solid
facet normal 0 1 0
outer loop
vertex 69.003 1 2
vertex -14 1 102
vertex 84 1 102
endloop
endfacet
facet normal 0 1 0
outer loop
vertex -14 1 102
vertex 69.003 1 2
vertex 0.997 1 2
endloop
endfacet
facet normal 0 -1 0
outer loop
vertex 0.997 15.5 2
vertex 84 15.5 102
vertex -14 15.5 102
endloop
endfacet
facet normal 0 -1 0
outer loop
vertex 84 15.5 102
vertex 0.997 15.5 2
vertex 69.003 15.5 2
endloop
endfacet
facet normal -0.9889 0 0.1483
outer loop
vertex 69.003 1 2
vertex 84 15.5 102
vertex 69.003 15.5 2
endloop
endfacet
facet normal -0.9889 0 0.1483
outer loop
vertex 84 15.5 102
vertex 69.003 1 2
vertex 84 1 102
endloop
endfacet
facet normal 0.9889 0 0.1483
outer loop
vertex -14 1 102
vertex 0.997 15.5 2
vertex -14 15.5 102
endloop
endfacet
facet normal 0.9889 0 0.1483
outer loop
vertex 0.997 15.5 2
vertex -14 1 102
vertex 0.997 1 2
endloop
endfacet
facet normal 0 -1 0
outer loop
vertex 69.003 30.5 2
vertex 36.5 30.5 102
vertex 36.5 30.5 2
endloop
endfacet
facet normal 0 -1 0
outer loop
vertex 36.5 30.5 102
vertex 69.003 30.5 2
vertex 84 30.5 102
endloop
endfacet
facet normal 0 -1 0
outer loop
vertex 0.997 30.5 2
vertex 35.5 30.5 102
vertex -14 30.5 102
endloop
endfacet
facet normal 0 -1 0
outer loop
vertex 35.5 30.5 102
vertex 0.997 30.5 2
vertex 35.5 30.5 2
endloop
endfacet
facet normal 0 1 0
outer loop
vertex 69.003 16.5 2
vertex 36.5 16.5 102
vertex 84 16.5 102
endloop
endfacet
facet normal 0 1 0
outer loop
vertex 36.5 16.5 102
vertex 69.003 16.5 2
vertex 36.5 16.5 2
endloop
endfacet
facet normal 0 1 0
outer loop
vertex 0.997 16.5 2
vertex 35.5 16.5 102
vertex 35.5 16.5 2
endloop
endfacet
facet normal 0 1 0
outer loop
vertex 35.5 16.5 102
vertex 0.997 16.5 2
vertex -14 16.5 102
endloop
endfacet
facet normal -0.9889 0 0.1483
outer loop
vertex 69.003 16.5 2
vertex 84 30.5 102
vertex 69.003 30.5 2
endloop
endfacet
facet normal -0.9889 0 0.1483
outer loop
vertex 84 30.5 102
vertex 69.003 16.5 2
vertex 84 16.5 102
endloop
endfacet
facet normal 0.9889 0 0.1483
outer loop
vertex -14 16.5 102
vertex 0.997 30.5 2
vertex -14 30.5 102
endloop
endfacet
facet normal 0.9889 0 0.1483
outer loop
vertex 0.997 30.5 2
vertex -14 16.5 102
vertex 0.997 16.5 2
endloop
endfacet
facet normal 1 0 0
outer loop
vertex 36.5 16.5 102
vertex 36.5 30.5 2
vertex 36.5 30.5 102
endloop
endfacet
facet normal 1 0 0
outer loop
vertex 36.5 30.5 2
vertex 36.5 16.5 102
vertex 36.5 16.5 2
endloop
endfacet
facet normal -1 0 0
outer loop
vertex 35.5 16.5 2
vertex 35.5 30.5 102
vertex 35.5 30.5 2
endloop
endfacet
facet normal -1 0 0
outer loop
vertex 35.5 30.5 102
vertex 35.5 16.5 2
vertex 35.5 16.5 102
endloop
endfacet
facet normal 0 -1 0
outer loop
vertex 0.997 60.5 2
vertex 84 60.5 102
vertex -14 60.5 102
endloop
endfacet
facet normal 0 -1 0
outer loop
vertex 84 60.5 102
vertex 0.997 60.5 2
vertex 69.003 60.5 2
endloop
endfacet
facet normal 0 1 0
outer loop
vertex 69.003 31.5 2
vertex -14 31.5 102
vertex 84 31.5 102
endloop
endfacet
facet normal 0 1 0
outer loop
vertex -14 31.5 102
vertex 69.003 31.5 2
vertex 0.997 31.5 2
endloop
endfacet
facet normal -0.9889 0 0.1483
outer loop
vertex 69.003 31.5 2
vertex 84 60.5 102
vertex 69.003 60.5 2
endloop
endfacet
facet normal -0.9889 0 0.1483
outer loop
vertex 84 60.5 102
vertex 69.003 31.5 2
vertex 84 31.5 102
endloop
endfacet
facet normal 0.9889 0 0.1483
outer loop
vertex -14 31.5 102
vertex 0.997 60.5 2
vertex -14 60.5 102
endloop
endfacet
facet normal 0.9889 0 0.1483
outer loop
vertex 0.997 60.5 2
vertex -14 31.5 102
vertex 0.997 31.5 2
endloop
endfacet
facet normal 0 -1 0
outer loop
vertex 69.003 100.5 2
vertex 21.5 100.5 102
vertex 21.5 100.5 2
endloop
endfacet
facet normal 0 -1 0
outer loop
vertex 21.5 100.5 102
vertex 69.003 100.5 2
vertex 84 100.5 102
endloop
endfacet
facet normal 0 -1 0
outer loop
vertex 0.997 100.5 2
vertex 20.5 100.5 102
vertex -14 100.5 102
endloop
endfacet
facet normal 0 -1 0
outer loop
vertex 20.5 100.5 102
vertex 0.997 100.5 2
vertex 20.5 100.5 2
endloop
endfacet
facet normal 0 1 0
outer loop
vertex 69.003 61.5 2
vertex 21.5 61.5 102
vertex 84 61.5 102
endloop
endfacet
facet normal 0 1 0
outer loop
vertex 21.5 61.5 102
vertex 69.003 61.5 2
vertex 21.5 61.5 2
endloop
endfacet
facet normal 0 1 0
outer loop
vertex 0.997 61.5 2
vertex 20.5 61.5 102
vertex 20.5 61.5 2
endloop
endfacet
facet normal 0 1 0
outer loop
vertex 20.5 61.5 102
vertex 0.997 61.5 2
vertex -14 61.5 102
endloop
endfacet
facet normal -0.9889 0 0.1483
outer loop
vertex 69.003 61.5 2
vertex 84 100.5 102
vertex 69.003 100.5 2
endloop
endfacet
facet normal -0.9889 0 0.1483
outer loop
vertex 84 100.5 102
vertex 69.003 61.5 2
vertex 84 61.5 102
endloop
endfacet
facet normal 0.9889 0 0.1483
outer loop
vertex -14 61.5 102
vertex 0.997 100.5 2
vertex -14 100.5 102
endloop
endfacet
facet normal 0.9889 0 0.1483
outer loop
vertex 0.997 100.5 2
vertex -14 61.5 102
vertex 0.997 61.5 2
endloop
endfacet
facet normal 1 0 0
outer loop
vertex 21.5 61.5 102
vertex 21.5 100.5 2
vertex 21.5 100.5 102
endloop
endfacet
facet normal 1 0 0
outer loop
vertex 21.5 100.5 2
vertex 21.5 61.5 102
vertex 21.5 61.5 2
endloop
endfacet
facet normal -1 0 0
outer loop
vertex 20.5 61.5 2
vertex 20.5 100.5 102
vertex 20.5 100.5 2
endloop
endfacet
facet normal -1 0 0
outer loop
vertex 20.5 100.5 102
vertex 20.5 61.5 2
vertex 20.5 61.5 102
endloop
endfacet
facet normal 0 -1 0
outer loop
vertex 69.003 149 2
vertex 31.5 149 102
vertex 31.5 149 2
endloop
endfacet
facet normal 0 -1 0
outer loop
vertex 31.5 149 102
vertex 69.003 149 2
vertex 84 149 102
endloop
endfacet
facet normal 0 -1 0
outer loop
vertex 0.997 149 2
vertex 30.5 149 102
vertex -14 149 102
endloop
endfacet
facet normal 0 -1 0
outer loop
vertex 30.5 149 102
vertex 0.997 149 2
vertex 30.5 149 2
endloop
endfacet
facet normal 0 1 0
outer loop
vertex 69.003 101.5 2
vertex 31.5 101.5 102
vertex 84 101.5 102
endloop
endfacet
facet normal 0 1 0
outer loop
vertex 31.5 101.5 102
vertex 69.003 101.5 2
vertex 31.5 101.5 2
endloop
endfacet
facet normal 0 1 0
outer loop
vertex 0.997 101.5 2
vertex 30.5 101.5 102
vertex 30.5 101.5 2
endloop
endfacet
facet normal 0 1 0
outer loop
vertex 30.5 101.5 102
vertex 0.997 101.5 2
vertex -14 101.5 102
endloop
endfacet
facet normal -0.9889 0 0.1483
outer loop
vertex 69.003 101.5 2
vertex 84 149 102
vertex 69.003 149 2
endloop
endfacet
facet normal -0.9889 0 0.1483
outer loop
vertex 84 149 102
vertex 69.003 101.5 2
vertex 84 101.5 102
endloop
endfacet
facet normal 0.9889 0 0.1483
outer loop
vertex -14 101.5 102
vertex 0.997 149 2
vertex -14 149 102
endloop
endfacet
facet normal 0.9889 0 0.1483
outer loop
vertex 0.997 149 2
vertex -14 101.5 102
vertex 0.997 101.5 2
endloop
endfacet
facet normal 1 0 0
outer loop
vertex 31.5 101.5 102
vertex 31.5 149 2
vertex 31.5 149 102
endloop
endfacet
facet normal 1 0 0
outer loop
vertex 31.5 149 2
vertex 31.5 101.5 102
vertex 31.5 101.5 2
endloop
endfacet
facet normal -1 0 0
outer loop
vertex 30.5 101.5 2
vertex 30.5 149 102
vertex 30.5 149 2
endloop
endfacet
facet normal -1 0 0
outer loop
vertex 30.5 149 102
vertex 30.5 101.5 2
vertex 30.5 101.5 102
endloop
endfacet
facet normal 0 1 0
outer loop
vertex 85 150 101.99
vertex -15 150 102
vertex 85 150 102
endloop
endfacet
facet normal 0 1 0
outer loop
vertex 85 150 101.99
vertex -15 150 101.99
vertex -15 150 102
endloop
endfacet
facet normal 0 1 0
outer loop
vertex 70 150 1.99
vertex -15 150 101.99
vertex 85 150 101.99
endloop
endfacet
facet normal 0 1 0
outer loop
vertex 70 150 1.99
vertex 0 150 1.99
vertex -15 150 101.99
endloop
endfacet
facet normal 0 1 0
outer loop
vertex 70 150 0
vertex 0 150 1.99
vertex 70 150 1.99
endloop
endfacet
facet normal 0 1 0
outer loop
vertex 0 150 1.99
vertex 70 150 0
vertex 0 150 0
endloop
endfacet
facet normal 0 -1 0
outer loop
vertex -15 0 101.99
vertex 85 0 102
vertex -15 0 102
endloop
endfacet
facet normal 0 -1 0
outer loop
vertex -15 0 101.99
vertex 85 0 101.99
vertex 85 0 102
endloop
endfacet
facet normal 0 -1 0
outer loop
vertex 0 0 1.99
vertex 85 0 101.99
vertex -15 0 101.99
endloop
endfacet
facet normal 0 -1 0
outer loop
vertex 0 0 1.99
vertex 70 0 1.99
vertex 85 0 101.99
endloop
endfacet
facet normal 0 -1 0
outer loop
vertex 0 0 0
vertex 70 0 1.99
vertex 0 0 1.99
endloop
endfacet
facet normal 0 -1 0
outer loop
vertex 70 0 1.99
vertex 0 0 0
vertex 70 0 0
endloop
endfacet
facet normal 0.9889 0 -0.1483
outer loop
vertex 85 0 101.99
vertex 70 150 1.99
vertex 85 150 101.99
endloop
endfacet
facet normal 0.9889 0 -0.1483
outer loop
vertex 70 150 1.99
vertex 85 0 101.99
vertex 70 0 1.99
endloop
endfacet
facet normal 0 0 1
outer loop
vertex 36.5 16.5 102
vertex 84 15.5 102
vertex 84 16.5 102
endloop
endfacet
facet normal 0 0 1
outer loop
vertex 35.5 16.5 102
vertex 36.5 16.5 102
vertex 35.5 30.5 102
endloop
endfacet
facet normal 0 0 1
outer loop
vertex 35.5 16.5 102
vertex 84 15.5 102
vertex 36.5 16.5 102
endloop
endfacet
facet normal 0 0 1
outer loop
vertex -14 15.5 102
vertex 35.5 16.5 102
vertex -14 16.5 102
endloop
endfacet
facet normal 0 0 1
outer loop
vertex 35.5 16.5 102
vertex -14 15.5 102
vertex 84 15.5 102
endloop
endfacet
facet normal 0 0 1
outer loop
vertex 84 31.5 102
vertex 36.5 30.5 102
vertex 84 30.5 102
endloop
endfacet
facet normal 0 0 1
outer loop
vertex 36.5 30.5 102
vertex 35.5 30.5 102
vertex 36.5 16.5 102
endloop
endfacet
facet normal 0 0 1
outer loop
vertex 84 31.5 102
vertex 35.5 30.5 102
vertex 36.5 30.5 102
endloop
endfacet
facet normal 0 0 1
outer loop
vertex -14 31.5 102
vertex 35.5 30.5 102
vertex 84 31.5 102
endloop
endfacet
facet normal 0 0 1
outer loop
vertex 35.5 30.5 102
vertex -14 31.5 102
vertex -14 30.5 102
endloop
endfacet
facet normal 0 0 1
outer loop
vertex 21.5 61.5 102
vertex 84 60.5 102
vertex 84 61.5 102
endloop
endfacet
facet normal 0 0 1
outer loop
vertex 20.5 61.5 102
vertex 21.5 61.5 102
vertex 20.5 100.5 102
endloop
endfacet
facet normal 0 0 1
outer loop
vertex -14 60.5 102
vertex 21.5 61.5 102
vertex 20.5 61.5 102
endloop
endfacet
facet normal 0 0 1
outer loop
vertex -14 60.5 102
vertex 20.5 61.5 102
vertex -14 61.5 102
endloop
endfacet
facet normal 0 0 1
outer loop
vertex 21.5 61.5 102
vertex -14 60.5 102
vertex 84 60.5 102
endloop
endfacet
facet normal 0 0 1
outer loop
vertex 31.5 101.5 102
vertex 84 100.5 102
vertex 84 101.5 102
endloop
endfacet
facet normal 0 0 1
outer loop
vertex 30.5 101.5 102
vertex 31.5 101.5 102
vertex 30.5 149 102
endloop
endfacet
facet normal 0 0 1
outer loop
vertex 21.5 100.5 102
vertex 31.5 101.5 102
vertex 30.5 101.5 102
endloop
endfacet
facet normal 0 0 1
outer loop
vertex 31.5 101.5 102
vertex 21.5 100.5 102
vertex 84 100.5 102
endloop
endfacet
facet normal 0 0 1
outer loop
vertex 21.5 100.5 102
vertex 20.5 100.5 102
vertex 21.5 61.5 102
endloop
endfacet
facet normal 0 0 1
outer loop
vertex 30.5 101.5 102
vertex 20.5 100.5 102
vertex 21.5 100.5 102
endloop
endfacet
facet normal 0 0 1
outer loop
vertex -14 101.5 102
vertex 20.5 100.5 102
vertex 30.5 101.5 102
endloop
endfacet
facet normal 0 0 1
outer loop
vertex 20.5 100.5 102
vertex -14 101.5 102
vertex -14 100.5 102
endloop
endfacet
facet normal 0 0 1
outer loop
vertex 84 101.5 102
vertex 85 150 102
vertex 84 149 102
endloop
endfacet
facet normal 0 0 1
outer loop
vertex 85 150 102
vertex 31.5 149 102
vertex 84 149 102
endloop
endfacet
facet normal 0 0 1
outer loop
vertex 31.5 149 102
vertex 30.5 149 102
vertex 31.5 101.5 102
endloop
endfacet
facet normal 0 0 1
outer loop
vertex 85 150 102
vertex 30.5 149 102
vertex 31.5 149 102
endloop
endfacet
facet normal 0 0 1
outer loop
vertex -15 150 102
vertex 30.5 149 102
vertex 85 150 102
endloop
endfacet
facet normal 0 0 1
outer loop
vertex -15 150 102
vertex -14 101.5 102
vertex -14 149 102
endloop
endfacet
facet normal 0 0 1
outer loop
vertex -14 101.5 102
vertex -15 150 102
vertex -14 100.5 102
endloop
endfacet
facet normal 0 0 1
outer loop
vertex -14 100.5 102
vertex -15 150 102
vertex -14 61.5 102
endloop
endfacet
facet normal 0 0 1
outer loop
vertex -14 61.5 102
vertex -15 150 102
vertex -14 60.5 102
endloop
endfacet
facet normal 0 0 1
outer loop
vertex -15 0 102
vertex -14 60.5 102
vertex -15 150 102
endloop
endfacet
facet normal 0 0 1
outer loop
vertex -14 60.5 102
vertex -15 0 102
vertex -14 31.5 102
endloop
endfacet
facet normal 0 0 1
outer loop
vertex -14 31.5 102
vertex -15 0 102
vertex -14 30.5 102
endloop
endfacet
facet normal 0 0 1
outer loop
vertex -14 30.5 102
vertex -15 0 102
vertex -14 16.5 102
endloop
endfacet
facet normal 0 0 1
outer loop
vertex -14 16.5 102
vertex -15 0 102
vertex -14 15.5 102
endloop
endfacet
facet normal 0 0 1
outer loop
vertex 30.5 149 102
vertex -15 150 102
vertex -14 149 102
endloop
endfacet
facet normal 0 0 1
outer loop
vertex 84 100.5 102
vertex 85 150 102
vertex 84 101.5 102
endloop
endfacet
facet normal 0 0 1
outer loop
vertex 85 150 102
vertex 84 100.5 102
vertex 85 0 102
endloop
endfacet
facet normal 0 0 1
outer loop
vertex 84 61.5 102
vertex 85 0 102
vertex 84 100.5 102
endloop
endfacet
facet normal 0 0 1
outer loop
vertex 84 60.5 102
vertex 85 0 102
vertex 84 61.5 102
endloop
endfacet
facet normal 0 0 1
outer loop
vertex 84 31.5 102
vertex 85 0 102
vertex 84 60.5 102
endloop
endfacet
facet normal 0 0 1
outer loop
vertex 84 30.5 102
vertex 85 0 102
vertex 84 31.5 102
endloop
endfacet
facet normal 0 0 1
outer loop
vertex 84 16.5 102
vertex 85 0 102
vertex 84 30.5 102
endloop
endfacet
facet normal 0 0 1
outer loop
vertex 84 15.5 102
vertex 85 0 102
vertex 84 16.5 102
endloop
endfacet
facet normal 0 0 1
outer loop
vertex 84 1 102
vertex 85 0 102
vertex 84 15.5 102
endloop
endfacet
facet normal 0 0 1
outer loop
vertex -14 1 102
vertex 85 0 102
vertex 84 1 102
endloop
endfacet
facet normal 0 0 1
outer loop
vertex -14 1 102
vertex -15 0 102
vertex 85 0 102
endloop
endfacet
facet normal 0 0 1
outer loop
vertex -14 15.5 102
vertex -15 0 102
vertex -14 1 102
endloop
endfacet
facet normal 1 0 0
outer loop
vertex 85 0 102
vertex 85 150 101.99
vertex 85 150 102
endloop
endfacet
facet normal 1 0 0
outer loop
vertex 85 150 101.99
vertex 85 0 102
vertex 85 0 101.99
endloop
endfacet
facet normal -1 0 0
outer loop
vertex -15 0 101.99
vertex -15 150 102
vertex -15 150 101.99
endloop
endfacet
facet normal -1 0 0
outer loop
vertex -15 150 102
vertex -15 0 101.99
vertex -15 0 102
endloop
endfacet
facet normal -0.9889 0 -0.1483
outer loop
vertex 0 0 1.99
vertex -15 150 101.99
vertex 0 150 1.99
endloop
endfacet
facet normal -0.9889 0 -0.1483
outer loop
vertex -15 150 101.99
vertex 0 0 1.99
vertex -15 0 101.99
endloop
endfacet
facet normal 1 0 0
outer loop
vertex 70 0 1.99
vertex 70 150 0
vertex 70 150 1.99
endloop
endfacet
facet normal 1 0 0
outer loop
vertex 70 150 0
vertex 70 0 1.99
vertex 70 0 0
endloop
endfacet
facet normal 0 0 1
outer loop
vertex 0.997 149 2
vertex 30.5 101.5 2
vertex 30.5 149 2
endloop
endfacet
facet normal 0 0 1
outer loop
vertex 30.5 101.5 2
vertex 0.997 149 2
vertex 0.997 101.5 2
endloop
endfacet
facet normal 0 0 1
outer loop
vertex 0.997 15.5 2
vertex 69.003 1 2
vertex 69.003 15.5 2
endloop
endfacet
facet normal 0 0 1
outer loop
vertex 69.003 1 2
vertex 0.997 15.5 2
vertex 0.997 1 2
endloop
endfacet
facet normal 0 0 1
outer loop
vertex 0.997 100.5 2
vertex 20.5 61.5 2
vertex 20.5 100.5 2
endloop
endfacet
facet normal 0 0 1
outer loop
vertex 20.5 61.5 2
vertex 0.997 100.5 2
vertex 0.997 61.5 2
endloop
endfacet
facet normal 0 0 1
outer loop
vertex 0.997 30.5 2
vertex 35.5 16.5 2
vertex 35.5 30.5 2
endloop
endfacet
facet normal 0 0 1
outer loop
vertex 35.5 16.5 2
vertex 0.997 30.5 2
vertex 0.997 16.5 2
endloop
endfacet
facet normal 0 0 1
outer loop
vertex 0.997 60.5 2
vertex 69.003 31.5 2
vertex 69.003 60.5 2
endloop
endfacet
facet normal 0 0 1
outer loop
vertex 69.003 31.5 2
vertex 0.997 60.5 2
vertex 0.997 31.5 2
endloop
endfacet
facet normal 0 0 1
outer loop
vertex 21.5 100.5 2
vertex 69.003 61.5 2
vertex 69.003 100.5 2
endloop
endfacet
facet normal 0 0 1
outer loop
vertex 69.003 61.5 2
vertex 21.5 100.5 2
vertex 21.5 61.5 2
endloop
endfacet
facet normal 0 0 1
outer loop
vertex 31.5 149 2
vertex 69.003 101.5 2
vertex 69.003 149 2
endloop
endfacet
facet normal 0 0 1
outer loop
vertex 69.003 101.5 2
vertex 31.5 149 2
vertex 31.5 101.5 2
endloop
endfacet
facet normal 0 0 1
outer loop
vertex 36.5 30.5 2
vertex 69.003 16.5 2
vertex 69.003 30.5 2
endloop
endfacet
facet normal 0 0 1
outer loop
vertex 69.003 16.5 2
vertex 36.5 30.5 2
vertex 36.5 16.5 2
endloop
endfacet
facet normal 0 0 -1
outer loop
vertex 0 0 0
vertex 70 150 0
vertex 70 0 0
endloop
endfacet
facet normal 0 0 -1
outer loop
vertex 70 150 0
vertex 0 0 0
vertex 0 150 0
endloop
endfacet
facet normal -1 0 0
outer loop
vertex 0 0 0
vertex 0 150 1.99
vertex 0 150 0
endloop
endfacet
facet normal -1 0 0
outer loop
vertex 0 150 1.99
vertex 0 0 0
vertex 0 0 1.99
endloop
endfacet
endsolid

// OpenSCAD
// file: caddy_organizer_divider.scad
/*
 * Designed for tool caddy found at WM or auto parts stores with
 * center handle and a deep tray on either side.  Makes some of
 * the space useable for holding larger tools upright.
 */

$fn=50;
overlap=0.01;

caddyOrganizerDivider(); // test defaults.

// Show "missing zero offset element" bug
translate([75,0,0])
    caddyOrganizerDivider(crosswaysDividerOffsets=[30]);
    

module caddyOrganizerDivider(bottomThickness=2, wallThickness=1, 
        bottomWidth=50, topWidth=55,
        bottomLength=75, topLength=80,
        wallHeight=25,
        crosswaysDividerOffsets=[0,30],
        lengthwiseSplits=[[25],[15,35]]) {

    innerLengthBottom=bottomLength-wallThickness*2;
    innerLengthTop=topLength-wallThickness*2;
    extraLengthTop=innerLengthTop-innerLengthBottom;
    // bottom
    cube([bottomWidth,bottomLength,bottomThickness]);

    difference() {
        // outer shell - sides tapered, ends square 
        translate([0,0,bottomThickness-overlap])
            taperedBox(bw=bottomWidth, tw=topWidth, bl=bottomLength, tl=topLength, ht=wallHeight+overlap);
        // cross slots

        if (crosswaysDividerOffsets[0] != 0)
            echo("Warning: First item in crosswaysDividerOffsets must be zero.");
        // TODO: Fix logic when crosswaysDividers does not have 0 as its first value.

        for (i=[0:1:len(crosswaysDividerOffsets)-1]) {
            isFirstCutout=(i==0);
            isLastCutout=(i==(len(crosswaysDividerOffsets)-1));
            cutoutLengthBottom = ((!isLastCutout) ? // up to the penultimate item
                (crosswaysDividerOffsets[i+1]-crosswaysDividerOffsets[i]) :  // if there is another divider
                (innerLengthBottom-crosswaysDividerOffsets[i]))  // if this is the last divider
                - ((isFirstCutout || isLastCutout) ? wallThickness/2 : wallThickness);
            cutoutLengthTop = ((!isLastCutout) ? // up to the penultimate item
                (crosswaysDividerOffsets[i+1]-crosswaysDividerOffsets[i]) :  // if there is another divider, length is next offset - this offset
                (innerLengthBottom-crosswaysDividerOffsets[i]))  // if this is the last divider
                + ((isFirstCutout || isLastCutout) ? extraLengthTop/2 : 0)
                - ((isFirstCutout || isLastCutout) ? wallThickness/2 : wallThickness);
            // echo(cutoutLengthBottom);
            //    outer wall + 1 more wall thickness after each pocket.
            yPosition = wallThickness + ((i==0) ? 0 : crosswaysDividerOffsets[i]+wallThickness/2);
            translate([wallThickness, yPosition, bottomThickness-overlap*2]) {
                // flip and shift only the first block
               translate([0,((isFirstCutout) ? cutoutLengthBottom : 0),0]) mirror([0,((isFirstCutout) ? 1 : 0),0]) {
                difference() {
                    // crossways block
                        taperedBox(bw=bottomWidth-wallThickness*2, tw=topWidth-wallThickness*2, 
                            bl=cutoutLengthBottom, tl=cutoutLengthTop, 
                                ht=wallHeight+overlap*3, centerLengthWise=false);
                        for (l=[0:1:len(lengthwiseSplits[i])-1]) {        
                            if (len(lengthwiseSplits[i]) != 0) {
                                translate([lengthwiseSplits[i][l]-wallThickness/2,-overlap,-overlap])
                                    cube([wallThickness,cutoutLengthTop+overlap*2,wallHeight+overlap*5]);
                            }
                        } 
                    }  // flip and shift everything
                }
            }        
        }
    }
}


module taperedBox(bw, tw, bl, tl, ht, centerWidthWise=true, centerLengthWise=true) {
    hull() {
        translate([0,0,0])
            cube([bw,bl,overlap]);
        translate([((centerWidthWise) ? -(abs(tw-bw)/2) : 0), ((centerLengthWise) ? -(abs(tl-bl)/2) : 0),ht-overlap])
            cube([tw,tl,overlap]);
    }
}
// main file
use <caddy_organizer_divider.scad>

// short, ~1/3 of the side pocket of the large aluminum bar handle caddy
bottomWidth=70;
topWidth=100;
wallHeight=100;
crosswaysDividerOffsets=[0,15,30,60,100];
lengthwiseSplits=[[],[35],[],[20],[30]];
bottomLength=150;
topLength=150;

caddyOrganizerDivider(bottomWidth=bottomWidth, topWidth=topWidth, bottomLength=bottomLength, 
    topLength=topLength, wallHeight=wallHeight,crosswaysDividerOffsets=crosswaysDividerOffsets,lengthwiseSplits=lengthwiseSplits);
